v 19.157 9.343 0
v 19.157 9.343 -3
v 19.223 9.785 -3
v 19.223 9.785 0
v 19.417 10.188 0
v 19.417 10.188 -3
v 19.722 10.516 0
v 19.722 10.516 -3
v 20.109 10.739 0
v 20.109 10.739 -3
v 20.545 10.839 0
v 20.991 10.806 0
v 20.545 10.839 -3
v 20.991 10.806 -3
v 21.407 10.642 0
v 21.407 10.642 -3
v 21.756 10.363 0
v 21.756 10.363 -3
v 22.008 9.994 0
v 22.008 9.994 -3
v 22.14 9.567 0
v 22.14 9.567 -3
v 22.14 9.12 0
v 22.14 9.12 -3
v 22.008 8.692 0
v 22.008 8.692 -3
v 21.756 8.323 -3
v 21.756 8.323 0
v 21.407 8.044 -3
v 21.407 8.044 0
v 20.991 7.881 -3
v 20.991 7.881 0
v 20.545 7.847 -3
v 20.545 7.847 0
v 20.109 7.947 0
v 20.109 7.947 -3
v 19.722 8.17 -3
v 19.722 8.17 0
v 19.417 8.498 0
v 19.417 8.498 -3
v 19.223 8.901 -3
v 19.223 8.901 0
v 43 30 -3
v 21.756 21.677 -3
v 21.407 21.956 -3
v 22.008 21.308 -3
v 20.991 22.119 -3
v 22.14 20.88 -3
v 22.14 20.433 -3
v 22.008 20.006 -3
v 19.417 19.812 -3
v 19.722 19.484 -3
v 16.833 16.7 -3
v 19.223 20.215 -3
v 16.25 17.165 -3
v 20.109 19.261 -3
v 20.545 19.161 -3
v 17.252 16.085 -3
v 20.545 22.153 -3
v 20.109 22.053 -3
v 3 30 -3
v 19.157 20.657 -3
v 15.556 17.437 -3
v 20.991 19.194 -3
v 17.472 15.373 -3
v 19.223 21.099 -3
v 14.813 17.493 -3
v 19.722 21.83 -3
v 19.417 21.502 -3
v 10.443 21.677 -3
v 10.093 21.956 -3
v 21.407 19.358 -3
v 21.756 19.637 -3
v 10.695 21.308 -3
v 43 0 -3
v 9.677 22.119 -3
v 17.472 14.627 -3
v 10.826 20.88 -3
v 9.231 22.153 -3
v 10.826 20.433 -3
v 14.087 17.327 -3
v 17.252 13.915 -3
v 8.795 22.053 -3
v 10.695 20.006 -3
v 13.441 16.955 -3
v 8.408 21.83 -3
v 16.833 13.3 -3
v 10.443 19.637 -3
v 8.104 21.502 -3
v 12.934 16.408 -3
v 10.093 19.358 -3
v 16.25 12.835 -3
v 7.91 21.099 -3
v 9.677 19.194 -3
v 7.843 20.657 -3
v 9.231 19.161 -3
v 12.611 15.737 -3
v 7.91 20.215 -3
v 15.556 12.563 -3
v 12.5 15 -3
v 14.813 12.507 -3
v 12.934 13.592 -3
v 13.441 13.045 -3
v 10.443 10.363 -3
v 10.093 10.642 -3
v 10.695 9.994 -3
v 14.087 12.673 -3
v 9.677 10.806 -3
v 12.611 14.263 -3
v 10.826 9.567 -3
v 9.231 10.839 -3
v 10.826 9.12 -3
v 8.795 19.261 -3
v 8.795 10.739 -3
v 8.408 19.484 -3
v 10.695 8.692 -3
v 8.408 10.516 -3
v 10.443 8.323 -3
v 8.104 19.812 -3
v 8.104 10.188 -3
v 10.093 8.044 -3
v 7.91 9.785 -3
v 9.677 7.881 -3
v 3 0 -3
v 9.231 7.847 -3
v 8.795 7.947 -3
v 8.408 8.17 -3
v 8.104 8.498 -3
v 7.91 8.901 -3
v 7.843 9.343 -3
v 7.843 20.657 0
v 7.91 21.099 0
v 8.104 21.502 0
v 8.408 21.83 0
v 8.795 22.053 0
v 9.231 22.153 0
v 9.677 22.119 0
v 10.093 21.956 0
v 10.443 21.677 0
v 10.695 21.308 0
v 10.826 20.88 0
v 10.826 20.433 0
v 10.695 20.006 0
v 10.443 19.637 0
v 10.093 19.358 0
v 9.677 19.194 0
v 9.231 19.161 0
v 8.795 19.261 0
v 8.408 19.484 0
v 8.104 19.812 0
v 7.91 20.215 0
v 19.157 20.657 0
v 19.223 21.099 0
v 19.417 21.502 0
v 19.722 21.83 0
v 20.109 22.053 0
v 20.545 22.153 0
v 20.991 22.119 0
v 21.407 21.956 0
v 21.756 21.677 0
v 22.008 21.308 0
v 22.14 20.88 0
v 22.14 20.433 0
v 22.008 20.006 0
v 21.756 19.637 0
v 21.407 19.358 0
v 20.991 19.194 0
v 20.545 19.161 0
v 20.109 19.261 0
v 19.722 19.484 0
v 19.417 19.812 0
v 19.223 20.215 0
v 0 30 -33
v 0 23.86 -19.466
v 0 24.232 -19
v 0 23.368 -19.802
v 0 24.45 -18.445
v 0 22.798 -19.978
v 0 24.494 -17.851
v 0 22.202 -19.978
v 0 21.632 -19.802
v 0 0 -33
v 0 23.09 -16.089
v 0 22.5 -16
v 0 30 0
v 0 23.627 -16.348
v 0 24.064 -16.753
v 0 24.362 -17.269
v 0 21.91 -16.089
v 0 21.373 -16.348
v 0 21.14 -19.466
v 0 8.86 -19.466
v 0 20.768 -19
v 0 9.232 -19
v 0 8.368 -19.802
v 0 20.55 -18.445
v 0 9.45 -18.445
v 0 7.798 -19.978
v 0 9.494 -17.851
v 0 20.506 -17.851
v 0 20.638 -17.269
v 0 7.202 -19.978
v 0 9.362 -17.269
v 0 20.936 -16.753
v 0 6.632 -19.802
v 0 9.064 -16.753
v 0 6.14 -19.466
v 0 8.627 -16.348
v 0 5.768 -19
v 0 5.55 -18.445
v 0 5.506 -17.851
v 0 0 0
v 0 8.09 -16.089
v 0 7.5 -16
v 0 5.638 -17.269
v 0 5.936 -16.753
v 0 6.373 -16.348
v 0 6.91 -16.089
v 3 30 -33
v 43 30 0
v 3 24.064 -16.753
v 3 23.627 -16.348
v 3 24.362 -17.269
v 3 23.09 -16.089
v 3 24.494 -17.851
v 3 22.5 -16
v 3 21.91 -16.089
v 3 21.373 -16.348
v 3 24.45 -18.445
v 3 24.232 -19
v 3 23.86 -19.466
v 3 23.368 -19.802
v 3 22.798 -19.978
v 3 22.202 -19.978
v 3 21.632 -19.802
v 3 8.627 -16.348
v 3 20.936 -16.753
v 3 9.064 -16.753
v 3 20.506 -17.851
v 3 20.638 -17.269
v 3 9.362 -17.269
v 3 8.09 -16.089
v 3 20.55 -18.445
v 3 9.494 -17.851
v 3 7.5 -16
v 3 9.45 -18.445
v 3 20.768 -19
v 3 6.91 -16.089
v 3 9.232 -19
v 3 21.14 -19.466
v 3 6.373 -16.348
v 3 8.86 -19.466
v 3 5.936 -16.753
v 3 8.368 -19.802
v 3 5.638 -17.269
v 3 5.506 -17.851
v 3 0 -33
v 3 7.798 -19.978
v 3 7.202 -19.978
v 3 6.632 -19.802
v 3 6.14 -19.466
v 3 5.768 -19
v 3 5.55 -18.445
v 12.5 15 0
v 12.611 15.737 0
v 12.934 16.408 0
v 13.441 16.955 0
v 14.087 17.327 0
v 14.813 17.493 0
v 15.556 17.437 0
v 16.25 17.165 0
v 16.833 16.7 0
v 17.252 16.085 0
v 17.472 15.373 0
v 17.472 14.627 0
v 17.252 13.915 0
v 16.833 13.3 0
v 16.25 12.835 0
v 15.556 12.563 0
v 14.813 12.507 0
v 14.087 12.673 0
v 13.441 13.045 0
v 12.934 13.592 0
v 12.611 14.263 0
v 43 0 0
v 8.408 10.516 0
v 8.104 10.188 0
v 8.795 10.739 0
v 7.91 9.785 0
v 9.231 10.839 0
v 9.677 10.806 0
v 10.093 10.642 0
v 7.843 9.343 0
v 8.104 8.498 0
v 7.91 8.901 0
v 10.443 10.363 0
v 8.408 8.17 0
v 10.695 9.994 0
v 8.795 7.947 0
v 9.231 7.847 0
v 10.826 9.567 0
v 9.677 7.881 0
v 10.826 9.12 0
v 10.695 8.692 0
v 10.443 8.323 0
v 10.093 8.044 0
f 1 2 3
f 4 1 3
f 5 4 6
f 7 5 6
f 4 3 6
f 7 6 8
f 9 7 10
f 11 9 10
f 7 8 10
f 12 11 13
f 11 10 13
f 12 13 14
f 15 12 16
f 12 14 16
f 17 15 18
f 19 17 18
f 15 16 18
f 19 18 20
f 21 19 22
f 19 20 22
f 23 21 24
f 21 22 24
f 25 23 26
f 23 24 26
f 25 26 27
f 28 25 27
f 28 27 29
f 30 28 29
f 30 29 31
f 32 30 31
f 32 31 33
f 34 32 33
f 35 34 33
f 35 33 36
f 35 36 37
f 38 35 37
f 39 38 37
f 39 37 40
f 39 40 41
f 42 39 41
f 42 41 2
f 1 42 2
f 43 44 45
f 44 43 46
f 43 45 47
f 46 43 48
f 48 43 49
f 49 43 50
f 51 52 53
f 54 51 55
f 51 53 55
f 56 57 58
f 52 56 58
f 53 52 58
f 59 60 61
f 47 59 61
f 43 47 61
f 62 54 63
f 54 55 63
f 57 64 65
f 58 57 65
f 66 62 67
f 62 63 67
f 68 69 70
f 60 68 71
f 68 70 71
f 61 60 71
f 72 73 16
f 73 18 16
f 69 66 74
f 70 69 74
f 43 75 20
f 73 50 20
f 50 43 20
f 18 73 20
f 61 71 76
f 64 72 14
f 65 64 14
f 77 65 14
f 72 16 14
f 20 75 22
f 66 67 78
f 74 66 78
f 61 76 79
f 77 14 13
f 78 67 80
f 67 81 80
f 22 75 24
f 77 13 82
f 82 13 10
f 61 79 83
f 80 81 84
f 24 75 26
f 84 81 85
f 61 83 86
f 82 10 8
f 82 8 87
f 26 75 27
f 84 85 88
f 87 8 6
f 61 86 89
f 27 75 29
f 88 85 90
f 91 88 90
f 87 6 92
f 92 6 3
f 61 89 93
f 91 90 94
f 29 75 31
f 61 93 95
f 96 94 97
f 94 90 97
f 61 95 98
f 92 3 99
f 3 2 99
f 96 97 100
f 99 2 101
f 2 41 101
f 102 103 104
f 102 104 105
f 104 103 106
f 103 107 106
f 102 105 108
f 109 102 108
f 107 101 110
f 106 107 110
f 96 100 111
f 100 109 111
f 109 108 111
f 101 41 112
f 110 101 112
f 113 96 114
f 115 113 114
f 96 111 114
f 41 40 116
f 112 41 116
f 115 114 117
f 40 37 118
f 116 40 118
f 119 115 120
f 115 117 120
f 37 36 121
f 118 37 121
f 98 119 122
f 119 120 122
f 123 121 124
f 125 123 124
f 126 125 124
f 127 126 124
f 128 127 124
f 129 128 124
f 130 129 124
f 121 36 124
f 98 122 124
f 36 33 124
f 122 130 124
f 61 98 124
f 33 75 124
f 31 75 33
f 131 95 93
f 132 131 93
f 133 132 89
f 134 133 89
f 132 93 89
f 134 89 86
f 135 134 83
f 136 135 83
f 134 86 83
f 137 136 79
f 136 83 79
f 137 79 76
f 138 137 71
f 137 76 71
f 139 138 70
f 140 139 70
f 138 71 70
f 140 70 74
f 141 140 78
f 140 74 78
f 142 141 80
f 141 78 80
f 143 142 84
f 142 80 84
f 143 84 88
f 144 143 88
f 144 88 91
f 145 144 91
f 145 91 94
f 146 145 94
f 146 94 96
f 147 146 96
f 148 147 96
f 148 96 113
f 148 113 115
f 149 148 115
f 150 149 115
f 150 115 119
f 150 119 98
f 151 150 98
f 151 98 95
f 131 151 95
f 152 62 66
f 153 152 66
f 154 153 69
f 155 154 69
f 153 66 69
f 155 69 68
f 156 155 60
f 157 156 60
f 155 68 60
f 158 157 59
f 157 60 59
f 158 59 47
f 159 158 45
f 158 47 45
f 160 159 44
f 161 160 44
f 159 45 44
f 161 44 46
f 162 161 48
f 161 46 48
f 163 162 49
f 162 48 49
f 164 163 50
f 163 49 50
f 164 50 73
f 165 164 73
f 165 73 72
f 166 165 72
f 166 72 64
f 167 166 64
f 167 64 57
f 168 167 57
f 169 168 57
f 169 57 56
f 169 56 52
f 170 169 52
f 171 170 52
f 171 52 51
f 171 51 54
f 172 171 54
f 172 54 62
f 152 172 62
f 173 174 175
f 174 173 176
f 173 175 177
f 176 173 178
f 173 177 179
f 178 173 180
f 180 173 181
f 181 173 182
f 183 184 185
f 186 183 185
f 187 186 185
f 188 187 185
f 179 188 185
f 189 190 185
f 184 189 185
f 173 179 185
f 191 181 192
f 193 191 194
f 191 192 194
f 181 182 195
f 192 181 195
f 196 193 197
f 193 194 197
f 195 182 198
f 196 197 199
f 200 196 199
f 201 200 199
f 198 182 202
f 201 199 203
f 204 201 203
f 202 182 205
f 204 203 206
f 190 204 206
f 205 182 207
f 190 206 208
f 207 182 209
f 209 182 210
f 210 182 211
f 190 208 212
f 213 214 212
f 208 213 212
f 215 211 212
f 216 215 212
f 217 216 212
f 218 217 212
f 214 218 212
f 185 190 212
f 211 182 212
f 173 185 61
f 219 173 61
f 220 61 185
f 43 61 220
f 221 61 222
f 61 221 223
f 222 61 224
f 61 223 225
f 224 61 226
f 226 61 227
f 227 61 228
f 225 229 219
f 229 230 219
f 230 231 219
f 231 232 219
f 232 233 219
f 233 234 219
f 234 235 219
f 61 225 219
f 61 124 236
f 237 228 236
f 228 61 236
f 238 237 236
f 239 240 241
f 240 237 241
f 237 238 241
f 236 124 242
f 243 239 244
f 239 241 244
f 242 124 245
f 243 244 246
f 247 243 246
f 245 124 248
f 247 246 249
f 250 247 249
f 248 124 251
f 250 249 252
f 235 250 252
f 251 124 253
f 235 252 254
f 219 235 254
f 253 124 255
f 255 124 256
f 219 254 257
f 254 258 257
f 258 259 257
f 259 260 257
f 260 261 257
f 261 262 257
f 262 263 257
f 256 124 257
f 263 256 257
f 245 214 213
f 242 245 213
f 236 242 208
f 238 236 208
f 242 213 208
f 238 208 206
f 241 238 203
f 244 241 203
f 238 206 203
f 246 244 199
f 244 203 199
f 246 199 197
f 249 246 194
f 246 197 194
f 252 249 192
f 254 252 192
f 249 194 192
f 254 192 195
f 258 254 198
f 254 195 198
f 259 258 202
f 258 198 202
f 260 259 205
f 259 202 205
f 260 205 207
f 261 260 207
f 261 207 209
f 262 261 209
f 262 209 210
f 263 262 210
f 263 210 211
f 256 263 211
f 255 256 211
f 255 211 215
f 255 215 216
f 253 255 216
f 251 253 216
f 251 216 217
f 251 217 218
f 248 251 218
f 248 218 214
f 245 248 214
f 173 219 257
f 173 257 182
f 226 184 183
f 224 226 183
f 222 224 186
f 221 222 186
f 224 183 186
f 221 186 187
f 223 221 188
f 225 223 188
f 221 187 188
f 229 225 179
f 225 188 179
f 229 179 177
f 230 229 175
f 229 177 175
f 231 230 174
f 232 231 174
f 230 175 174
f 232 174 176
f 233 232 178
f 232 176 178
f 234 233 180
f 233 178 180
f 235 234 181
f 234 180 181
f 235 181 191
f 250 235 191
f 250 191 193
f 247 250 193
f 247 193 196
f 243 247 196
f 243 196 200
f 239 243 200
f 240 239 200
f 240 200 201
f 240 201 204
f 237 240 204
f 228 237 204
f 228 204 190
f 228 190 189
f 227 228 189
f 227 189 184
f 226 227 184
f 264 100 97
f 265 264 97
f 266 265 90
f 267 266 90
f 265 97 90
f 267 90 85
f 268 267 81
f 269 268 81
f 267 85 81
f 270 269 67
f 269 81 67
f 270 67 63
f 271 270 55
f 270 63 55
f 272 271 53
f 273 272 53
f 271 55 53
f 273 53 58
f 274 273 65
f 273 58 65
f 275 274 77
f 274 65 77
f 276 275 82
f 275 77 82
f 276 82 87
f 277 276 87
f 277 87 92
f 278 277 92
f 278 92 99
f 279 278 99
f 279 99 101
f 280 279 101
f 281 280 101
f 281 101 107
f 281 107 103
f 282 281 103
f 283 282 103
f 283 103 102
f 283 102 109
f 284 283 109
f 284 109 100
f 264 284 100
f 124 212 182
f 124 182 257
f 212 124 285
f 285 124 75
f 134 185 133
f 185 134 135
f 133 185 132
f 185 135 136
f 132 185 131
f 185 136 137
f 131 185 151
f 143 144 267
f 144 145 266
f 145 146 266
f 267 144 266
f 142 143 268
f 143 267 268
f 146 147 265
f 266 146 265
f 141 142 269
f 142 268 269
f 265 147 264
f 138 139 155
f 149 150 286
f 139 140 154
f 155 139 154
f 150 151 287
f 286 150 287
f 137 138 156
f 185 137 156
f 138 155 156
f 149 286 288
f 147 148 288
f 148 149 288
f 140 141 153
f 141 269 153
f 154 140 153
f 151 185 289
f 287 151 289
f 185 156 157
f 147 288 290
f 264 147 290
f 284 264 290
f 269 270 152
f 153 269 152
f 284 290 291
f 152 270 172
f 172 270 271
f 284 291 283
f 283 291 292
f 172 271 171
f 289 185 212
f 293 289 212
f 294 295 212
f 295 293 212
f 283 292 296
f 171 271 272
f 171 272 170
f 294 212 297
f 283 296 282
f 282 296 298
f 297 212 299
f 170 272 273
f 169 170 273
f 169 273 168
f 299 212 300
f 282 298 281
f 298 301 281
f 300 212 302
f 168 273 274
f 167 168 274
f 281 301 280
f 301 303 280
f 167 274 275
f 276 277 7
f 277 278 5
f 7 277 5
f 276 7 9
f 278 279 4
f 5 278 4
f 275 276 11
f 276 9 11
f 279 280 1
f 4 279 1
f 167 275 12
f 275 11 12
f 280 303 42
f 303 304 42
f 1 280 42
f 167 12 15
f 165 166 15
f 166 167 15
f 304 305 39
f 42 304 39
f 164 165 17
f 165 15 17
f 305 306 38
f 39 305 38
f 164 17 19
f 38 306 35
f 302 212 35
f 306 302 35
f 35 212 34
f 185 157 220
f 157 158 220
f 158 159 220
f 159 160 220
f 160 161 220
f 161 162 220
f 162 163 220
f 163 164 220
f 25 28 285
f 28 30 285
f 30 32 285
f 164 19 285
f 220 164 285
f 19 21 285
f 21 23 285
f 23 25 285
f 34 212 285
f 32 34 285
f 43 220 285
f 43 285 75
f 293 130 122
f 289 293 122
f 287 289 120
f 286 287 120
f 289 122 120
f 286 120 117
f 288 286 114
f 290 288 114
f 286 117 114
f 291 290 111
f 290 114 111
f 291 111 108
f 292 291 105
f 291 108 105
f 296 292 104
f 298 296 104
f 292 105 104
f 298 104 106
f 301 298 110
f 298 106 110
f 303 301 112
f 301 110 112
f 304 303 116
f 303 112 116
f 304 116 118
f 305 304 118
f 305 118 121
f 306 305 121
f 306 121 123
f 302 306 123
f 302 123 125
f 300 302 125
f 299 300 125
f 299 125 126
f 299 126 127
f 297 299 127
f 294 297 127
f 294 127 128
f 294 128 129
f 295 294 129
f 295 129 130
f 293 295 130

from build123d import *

# Parameters (mm, degrees)
EXTRUDE_1_DEPTH     = 30
CUT_EXTRUDE_1_REACH = 63.952
SKETCH_4_R          = 2
CUT_EXTRUDE_2_REACH = 62.407
SKETCH_5_R          = 2.5
SKETCH_5_R_2        = 1.5


with BuildPart() as part:
    # 草图2 → 凸台-拉伸1 (new body)
    with BuildSketch(Plane(origin=(0, 0, 0), x_dir=(1, 0, 0), z_dir=(0, 1, 0))):
        Polygon((0, 0), (43, 0), (43, 3), (3, 3), (3, 33), (0, 33), align=None)
    extrude(amount=EXTRUDE_1_DEPTH)

    # 草图4 → 切除-拉伸1 (cut, up to next)
    with BuildSketch(Plane.ZY, mode=Mode.PRIVATE) as cut_extrude_1_sk1:
        with Locations((-18, 7.5)):
            Circle(SKETCH_4_R)
    cut_extrude_1_tool1 = extrude(cut_extrude_1_sk1.sketch, amount=-CUT_EXTRUDE_1_REACH, mode=Mode.PRIVATE) & part.part
    # 草图4 → 切除-拉伸1 (cut, up to next)
    with BuildSketch(Plane.ZY, mode=Mode.PRIVATE) as cut_extrude_1_sk2:
        with Locations((-18, 22.5)):
            Circle(SKETCH_4_R)
    cut_extrude_1_tool2 = extrude(cut_extrude_1_sk2.sketch, amount=-CUT_EXTRUDE_1_REACH, mode=Mode.PRIVATE) & part.part
    add(cut_extrude_1_tool1.solids().sort_by_distance((0, 7.5, -18))[0], mode=Mode.SUBTRACT)
    add(cut_extrude_1_tool2.solids().sort_by_distance((0, 22.5, -18))[0], mode=Mode.SUBTRACT)

    # 草图5 → 切除-拉伸2 (cut, up to next)
    with BuildSketch(Plane(origin=(0, 0, -3), x_dir=(-1, 0, 0), z_dir=(0, 0, -1)), mode=Mode.PRIVATE) as cut_extrude_2_sk1:
        with Locations((-15, 15)):
            Circle(SKETCH_5_R)
    cut_extrude_2_tool1 = extrude(cut_extrude_2_sk1.sketch, amount=-CUT_EXTRUDE_2_REACH, mode=Mode.PRIVATE) & part.part
    # 草图5 → 切除-拉伸2 (cut, up to next)
    with BuildSketch(Plane(origin=(0, 0, -3), x_dir=(-1, 0, 0), z_dir=(0, 0, -1)), mode=Mode.PRIVATE) as cut_extrude_2_sk2:
        with Locations((-20.656854249, 9.343145751)):
            Circle(SKETCH_5_R_2)
    cut_extrude_2_tool2 = extrude(cut_extrude_2_sk2.sketch, amount=-CUT_EXTRUDE_2_REACH, mode=Mode.PRIVATE) & part.part
    # 草图5 → 切除-拉伸2 (cut, up to next)
    with BuildSketch(Plane(origin=(0, 0, -3), x_dir=(-1, 0, 0), z_dir=(0, 0, -1)), mode=Mode.PRIVATE) as cut_extrude_2_sk3:
        with Locations((-9.343145751, 9.343145751)):
            Circle(SKETCH_5_R_2)
    cut_extrude_2_tool3 = extrude(cut_extrude_2_sk3.sketch, amount=-CUT_EXTRUDE_2_REACH, mode=Mode.PRIVATE) & part.part
    # 草图5 → 切除-拉伸2 (cut, up to next)
    with BuildSketch(Plane(origin=(0, 0, -3), x_dir=(-1, 0, 0), z_dir=(0, 0, -1)), mode=Mode.PRIVATE) as cut_extrude_2_sk4:
        with Locations((-20.656854249, 20.656854249)):
            Circle(SKETCH_5_R_2)
    cut_extrude_2_tool4 = extrude(cut_extrude_2_sk4.sketch, amount=-CUT_EXTRUDE_2_REACH, mode=Mode.PRIVATE) & part.part
    # 草图5 → 切除-拉伸2 (cut, up to next)
    with BuildSketch(Plane(origin=(0, 0, -3), x_dir=(-1, 0, 0), z_dir=(0, 0, -1)), mode=Mode.PRIVATE) as cut_extrude_2_sk5:
        with Locations((-9.343145751, 20.656854249)):
            Circle(SKETCH_5_R_2)
    cut_extrude_2_tool5 = extrude(cut_extrude_2_sk5.sketch, amount=-CUT_EXTRUDE_2_REACH, mode=Mode.PRIVATE) & part.part
    add(cut_extrude_2_tool1.solids().sort_by_distance((15, 15, -3))[0], mode=Mode.SUBTRACT)
    add(cut_extrude_2_tool2.solids().sort_by_distance((20.656854, 9.343146, -3))[0], mode=Mode.SUBTRACT)
    add(cut_extrude_2_tool3.solids().sort_by_distance((9.343146, 9.343146, -3))[0], mode=Mode.SUBTRACT)
    add(cut_extrude_2_tool4.solids().sort_by_distance((20.656854, 20.656854, -3))[0], mode=Mode.SUBTRACT)
    add(cut_extrude_2_tool5.solids().sort_by_distance((9.343146, 20.656854, -3))[0], mode=Mode.SUBTRACT)


solid = part.part
